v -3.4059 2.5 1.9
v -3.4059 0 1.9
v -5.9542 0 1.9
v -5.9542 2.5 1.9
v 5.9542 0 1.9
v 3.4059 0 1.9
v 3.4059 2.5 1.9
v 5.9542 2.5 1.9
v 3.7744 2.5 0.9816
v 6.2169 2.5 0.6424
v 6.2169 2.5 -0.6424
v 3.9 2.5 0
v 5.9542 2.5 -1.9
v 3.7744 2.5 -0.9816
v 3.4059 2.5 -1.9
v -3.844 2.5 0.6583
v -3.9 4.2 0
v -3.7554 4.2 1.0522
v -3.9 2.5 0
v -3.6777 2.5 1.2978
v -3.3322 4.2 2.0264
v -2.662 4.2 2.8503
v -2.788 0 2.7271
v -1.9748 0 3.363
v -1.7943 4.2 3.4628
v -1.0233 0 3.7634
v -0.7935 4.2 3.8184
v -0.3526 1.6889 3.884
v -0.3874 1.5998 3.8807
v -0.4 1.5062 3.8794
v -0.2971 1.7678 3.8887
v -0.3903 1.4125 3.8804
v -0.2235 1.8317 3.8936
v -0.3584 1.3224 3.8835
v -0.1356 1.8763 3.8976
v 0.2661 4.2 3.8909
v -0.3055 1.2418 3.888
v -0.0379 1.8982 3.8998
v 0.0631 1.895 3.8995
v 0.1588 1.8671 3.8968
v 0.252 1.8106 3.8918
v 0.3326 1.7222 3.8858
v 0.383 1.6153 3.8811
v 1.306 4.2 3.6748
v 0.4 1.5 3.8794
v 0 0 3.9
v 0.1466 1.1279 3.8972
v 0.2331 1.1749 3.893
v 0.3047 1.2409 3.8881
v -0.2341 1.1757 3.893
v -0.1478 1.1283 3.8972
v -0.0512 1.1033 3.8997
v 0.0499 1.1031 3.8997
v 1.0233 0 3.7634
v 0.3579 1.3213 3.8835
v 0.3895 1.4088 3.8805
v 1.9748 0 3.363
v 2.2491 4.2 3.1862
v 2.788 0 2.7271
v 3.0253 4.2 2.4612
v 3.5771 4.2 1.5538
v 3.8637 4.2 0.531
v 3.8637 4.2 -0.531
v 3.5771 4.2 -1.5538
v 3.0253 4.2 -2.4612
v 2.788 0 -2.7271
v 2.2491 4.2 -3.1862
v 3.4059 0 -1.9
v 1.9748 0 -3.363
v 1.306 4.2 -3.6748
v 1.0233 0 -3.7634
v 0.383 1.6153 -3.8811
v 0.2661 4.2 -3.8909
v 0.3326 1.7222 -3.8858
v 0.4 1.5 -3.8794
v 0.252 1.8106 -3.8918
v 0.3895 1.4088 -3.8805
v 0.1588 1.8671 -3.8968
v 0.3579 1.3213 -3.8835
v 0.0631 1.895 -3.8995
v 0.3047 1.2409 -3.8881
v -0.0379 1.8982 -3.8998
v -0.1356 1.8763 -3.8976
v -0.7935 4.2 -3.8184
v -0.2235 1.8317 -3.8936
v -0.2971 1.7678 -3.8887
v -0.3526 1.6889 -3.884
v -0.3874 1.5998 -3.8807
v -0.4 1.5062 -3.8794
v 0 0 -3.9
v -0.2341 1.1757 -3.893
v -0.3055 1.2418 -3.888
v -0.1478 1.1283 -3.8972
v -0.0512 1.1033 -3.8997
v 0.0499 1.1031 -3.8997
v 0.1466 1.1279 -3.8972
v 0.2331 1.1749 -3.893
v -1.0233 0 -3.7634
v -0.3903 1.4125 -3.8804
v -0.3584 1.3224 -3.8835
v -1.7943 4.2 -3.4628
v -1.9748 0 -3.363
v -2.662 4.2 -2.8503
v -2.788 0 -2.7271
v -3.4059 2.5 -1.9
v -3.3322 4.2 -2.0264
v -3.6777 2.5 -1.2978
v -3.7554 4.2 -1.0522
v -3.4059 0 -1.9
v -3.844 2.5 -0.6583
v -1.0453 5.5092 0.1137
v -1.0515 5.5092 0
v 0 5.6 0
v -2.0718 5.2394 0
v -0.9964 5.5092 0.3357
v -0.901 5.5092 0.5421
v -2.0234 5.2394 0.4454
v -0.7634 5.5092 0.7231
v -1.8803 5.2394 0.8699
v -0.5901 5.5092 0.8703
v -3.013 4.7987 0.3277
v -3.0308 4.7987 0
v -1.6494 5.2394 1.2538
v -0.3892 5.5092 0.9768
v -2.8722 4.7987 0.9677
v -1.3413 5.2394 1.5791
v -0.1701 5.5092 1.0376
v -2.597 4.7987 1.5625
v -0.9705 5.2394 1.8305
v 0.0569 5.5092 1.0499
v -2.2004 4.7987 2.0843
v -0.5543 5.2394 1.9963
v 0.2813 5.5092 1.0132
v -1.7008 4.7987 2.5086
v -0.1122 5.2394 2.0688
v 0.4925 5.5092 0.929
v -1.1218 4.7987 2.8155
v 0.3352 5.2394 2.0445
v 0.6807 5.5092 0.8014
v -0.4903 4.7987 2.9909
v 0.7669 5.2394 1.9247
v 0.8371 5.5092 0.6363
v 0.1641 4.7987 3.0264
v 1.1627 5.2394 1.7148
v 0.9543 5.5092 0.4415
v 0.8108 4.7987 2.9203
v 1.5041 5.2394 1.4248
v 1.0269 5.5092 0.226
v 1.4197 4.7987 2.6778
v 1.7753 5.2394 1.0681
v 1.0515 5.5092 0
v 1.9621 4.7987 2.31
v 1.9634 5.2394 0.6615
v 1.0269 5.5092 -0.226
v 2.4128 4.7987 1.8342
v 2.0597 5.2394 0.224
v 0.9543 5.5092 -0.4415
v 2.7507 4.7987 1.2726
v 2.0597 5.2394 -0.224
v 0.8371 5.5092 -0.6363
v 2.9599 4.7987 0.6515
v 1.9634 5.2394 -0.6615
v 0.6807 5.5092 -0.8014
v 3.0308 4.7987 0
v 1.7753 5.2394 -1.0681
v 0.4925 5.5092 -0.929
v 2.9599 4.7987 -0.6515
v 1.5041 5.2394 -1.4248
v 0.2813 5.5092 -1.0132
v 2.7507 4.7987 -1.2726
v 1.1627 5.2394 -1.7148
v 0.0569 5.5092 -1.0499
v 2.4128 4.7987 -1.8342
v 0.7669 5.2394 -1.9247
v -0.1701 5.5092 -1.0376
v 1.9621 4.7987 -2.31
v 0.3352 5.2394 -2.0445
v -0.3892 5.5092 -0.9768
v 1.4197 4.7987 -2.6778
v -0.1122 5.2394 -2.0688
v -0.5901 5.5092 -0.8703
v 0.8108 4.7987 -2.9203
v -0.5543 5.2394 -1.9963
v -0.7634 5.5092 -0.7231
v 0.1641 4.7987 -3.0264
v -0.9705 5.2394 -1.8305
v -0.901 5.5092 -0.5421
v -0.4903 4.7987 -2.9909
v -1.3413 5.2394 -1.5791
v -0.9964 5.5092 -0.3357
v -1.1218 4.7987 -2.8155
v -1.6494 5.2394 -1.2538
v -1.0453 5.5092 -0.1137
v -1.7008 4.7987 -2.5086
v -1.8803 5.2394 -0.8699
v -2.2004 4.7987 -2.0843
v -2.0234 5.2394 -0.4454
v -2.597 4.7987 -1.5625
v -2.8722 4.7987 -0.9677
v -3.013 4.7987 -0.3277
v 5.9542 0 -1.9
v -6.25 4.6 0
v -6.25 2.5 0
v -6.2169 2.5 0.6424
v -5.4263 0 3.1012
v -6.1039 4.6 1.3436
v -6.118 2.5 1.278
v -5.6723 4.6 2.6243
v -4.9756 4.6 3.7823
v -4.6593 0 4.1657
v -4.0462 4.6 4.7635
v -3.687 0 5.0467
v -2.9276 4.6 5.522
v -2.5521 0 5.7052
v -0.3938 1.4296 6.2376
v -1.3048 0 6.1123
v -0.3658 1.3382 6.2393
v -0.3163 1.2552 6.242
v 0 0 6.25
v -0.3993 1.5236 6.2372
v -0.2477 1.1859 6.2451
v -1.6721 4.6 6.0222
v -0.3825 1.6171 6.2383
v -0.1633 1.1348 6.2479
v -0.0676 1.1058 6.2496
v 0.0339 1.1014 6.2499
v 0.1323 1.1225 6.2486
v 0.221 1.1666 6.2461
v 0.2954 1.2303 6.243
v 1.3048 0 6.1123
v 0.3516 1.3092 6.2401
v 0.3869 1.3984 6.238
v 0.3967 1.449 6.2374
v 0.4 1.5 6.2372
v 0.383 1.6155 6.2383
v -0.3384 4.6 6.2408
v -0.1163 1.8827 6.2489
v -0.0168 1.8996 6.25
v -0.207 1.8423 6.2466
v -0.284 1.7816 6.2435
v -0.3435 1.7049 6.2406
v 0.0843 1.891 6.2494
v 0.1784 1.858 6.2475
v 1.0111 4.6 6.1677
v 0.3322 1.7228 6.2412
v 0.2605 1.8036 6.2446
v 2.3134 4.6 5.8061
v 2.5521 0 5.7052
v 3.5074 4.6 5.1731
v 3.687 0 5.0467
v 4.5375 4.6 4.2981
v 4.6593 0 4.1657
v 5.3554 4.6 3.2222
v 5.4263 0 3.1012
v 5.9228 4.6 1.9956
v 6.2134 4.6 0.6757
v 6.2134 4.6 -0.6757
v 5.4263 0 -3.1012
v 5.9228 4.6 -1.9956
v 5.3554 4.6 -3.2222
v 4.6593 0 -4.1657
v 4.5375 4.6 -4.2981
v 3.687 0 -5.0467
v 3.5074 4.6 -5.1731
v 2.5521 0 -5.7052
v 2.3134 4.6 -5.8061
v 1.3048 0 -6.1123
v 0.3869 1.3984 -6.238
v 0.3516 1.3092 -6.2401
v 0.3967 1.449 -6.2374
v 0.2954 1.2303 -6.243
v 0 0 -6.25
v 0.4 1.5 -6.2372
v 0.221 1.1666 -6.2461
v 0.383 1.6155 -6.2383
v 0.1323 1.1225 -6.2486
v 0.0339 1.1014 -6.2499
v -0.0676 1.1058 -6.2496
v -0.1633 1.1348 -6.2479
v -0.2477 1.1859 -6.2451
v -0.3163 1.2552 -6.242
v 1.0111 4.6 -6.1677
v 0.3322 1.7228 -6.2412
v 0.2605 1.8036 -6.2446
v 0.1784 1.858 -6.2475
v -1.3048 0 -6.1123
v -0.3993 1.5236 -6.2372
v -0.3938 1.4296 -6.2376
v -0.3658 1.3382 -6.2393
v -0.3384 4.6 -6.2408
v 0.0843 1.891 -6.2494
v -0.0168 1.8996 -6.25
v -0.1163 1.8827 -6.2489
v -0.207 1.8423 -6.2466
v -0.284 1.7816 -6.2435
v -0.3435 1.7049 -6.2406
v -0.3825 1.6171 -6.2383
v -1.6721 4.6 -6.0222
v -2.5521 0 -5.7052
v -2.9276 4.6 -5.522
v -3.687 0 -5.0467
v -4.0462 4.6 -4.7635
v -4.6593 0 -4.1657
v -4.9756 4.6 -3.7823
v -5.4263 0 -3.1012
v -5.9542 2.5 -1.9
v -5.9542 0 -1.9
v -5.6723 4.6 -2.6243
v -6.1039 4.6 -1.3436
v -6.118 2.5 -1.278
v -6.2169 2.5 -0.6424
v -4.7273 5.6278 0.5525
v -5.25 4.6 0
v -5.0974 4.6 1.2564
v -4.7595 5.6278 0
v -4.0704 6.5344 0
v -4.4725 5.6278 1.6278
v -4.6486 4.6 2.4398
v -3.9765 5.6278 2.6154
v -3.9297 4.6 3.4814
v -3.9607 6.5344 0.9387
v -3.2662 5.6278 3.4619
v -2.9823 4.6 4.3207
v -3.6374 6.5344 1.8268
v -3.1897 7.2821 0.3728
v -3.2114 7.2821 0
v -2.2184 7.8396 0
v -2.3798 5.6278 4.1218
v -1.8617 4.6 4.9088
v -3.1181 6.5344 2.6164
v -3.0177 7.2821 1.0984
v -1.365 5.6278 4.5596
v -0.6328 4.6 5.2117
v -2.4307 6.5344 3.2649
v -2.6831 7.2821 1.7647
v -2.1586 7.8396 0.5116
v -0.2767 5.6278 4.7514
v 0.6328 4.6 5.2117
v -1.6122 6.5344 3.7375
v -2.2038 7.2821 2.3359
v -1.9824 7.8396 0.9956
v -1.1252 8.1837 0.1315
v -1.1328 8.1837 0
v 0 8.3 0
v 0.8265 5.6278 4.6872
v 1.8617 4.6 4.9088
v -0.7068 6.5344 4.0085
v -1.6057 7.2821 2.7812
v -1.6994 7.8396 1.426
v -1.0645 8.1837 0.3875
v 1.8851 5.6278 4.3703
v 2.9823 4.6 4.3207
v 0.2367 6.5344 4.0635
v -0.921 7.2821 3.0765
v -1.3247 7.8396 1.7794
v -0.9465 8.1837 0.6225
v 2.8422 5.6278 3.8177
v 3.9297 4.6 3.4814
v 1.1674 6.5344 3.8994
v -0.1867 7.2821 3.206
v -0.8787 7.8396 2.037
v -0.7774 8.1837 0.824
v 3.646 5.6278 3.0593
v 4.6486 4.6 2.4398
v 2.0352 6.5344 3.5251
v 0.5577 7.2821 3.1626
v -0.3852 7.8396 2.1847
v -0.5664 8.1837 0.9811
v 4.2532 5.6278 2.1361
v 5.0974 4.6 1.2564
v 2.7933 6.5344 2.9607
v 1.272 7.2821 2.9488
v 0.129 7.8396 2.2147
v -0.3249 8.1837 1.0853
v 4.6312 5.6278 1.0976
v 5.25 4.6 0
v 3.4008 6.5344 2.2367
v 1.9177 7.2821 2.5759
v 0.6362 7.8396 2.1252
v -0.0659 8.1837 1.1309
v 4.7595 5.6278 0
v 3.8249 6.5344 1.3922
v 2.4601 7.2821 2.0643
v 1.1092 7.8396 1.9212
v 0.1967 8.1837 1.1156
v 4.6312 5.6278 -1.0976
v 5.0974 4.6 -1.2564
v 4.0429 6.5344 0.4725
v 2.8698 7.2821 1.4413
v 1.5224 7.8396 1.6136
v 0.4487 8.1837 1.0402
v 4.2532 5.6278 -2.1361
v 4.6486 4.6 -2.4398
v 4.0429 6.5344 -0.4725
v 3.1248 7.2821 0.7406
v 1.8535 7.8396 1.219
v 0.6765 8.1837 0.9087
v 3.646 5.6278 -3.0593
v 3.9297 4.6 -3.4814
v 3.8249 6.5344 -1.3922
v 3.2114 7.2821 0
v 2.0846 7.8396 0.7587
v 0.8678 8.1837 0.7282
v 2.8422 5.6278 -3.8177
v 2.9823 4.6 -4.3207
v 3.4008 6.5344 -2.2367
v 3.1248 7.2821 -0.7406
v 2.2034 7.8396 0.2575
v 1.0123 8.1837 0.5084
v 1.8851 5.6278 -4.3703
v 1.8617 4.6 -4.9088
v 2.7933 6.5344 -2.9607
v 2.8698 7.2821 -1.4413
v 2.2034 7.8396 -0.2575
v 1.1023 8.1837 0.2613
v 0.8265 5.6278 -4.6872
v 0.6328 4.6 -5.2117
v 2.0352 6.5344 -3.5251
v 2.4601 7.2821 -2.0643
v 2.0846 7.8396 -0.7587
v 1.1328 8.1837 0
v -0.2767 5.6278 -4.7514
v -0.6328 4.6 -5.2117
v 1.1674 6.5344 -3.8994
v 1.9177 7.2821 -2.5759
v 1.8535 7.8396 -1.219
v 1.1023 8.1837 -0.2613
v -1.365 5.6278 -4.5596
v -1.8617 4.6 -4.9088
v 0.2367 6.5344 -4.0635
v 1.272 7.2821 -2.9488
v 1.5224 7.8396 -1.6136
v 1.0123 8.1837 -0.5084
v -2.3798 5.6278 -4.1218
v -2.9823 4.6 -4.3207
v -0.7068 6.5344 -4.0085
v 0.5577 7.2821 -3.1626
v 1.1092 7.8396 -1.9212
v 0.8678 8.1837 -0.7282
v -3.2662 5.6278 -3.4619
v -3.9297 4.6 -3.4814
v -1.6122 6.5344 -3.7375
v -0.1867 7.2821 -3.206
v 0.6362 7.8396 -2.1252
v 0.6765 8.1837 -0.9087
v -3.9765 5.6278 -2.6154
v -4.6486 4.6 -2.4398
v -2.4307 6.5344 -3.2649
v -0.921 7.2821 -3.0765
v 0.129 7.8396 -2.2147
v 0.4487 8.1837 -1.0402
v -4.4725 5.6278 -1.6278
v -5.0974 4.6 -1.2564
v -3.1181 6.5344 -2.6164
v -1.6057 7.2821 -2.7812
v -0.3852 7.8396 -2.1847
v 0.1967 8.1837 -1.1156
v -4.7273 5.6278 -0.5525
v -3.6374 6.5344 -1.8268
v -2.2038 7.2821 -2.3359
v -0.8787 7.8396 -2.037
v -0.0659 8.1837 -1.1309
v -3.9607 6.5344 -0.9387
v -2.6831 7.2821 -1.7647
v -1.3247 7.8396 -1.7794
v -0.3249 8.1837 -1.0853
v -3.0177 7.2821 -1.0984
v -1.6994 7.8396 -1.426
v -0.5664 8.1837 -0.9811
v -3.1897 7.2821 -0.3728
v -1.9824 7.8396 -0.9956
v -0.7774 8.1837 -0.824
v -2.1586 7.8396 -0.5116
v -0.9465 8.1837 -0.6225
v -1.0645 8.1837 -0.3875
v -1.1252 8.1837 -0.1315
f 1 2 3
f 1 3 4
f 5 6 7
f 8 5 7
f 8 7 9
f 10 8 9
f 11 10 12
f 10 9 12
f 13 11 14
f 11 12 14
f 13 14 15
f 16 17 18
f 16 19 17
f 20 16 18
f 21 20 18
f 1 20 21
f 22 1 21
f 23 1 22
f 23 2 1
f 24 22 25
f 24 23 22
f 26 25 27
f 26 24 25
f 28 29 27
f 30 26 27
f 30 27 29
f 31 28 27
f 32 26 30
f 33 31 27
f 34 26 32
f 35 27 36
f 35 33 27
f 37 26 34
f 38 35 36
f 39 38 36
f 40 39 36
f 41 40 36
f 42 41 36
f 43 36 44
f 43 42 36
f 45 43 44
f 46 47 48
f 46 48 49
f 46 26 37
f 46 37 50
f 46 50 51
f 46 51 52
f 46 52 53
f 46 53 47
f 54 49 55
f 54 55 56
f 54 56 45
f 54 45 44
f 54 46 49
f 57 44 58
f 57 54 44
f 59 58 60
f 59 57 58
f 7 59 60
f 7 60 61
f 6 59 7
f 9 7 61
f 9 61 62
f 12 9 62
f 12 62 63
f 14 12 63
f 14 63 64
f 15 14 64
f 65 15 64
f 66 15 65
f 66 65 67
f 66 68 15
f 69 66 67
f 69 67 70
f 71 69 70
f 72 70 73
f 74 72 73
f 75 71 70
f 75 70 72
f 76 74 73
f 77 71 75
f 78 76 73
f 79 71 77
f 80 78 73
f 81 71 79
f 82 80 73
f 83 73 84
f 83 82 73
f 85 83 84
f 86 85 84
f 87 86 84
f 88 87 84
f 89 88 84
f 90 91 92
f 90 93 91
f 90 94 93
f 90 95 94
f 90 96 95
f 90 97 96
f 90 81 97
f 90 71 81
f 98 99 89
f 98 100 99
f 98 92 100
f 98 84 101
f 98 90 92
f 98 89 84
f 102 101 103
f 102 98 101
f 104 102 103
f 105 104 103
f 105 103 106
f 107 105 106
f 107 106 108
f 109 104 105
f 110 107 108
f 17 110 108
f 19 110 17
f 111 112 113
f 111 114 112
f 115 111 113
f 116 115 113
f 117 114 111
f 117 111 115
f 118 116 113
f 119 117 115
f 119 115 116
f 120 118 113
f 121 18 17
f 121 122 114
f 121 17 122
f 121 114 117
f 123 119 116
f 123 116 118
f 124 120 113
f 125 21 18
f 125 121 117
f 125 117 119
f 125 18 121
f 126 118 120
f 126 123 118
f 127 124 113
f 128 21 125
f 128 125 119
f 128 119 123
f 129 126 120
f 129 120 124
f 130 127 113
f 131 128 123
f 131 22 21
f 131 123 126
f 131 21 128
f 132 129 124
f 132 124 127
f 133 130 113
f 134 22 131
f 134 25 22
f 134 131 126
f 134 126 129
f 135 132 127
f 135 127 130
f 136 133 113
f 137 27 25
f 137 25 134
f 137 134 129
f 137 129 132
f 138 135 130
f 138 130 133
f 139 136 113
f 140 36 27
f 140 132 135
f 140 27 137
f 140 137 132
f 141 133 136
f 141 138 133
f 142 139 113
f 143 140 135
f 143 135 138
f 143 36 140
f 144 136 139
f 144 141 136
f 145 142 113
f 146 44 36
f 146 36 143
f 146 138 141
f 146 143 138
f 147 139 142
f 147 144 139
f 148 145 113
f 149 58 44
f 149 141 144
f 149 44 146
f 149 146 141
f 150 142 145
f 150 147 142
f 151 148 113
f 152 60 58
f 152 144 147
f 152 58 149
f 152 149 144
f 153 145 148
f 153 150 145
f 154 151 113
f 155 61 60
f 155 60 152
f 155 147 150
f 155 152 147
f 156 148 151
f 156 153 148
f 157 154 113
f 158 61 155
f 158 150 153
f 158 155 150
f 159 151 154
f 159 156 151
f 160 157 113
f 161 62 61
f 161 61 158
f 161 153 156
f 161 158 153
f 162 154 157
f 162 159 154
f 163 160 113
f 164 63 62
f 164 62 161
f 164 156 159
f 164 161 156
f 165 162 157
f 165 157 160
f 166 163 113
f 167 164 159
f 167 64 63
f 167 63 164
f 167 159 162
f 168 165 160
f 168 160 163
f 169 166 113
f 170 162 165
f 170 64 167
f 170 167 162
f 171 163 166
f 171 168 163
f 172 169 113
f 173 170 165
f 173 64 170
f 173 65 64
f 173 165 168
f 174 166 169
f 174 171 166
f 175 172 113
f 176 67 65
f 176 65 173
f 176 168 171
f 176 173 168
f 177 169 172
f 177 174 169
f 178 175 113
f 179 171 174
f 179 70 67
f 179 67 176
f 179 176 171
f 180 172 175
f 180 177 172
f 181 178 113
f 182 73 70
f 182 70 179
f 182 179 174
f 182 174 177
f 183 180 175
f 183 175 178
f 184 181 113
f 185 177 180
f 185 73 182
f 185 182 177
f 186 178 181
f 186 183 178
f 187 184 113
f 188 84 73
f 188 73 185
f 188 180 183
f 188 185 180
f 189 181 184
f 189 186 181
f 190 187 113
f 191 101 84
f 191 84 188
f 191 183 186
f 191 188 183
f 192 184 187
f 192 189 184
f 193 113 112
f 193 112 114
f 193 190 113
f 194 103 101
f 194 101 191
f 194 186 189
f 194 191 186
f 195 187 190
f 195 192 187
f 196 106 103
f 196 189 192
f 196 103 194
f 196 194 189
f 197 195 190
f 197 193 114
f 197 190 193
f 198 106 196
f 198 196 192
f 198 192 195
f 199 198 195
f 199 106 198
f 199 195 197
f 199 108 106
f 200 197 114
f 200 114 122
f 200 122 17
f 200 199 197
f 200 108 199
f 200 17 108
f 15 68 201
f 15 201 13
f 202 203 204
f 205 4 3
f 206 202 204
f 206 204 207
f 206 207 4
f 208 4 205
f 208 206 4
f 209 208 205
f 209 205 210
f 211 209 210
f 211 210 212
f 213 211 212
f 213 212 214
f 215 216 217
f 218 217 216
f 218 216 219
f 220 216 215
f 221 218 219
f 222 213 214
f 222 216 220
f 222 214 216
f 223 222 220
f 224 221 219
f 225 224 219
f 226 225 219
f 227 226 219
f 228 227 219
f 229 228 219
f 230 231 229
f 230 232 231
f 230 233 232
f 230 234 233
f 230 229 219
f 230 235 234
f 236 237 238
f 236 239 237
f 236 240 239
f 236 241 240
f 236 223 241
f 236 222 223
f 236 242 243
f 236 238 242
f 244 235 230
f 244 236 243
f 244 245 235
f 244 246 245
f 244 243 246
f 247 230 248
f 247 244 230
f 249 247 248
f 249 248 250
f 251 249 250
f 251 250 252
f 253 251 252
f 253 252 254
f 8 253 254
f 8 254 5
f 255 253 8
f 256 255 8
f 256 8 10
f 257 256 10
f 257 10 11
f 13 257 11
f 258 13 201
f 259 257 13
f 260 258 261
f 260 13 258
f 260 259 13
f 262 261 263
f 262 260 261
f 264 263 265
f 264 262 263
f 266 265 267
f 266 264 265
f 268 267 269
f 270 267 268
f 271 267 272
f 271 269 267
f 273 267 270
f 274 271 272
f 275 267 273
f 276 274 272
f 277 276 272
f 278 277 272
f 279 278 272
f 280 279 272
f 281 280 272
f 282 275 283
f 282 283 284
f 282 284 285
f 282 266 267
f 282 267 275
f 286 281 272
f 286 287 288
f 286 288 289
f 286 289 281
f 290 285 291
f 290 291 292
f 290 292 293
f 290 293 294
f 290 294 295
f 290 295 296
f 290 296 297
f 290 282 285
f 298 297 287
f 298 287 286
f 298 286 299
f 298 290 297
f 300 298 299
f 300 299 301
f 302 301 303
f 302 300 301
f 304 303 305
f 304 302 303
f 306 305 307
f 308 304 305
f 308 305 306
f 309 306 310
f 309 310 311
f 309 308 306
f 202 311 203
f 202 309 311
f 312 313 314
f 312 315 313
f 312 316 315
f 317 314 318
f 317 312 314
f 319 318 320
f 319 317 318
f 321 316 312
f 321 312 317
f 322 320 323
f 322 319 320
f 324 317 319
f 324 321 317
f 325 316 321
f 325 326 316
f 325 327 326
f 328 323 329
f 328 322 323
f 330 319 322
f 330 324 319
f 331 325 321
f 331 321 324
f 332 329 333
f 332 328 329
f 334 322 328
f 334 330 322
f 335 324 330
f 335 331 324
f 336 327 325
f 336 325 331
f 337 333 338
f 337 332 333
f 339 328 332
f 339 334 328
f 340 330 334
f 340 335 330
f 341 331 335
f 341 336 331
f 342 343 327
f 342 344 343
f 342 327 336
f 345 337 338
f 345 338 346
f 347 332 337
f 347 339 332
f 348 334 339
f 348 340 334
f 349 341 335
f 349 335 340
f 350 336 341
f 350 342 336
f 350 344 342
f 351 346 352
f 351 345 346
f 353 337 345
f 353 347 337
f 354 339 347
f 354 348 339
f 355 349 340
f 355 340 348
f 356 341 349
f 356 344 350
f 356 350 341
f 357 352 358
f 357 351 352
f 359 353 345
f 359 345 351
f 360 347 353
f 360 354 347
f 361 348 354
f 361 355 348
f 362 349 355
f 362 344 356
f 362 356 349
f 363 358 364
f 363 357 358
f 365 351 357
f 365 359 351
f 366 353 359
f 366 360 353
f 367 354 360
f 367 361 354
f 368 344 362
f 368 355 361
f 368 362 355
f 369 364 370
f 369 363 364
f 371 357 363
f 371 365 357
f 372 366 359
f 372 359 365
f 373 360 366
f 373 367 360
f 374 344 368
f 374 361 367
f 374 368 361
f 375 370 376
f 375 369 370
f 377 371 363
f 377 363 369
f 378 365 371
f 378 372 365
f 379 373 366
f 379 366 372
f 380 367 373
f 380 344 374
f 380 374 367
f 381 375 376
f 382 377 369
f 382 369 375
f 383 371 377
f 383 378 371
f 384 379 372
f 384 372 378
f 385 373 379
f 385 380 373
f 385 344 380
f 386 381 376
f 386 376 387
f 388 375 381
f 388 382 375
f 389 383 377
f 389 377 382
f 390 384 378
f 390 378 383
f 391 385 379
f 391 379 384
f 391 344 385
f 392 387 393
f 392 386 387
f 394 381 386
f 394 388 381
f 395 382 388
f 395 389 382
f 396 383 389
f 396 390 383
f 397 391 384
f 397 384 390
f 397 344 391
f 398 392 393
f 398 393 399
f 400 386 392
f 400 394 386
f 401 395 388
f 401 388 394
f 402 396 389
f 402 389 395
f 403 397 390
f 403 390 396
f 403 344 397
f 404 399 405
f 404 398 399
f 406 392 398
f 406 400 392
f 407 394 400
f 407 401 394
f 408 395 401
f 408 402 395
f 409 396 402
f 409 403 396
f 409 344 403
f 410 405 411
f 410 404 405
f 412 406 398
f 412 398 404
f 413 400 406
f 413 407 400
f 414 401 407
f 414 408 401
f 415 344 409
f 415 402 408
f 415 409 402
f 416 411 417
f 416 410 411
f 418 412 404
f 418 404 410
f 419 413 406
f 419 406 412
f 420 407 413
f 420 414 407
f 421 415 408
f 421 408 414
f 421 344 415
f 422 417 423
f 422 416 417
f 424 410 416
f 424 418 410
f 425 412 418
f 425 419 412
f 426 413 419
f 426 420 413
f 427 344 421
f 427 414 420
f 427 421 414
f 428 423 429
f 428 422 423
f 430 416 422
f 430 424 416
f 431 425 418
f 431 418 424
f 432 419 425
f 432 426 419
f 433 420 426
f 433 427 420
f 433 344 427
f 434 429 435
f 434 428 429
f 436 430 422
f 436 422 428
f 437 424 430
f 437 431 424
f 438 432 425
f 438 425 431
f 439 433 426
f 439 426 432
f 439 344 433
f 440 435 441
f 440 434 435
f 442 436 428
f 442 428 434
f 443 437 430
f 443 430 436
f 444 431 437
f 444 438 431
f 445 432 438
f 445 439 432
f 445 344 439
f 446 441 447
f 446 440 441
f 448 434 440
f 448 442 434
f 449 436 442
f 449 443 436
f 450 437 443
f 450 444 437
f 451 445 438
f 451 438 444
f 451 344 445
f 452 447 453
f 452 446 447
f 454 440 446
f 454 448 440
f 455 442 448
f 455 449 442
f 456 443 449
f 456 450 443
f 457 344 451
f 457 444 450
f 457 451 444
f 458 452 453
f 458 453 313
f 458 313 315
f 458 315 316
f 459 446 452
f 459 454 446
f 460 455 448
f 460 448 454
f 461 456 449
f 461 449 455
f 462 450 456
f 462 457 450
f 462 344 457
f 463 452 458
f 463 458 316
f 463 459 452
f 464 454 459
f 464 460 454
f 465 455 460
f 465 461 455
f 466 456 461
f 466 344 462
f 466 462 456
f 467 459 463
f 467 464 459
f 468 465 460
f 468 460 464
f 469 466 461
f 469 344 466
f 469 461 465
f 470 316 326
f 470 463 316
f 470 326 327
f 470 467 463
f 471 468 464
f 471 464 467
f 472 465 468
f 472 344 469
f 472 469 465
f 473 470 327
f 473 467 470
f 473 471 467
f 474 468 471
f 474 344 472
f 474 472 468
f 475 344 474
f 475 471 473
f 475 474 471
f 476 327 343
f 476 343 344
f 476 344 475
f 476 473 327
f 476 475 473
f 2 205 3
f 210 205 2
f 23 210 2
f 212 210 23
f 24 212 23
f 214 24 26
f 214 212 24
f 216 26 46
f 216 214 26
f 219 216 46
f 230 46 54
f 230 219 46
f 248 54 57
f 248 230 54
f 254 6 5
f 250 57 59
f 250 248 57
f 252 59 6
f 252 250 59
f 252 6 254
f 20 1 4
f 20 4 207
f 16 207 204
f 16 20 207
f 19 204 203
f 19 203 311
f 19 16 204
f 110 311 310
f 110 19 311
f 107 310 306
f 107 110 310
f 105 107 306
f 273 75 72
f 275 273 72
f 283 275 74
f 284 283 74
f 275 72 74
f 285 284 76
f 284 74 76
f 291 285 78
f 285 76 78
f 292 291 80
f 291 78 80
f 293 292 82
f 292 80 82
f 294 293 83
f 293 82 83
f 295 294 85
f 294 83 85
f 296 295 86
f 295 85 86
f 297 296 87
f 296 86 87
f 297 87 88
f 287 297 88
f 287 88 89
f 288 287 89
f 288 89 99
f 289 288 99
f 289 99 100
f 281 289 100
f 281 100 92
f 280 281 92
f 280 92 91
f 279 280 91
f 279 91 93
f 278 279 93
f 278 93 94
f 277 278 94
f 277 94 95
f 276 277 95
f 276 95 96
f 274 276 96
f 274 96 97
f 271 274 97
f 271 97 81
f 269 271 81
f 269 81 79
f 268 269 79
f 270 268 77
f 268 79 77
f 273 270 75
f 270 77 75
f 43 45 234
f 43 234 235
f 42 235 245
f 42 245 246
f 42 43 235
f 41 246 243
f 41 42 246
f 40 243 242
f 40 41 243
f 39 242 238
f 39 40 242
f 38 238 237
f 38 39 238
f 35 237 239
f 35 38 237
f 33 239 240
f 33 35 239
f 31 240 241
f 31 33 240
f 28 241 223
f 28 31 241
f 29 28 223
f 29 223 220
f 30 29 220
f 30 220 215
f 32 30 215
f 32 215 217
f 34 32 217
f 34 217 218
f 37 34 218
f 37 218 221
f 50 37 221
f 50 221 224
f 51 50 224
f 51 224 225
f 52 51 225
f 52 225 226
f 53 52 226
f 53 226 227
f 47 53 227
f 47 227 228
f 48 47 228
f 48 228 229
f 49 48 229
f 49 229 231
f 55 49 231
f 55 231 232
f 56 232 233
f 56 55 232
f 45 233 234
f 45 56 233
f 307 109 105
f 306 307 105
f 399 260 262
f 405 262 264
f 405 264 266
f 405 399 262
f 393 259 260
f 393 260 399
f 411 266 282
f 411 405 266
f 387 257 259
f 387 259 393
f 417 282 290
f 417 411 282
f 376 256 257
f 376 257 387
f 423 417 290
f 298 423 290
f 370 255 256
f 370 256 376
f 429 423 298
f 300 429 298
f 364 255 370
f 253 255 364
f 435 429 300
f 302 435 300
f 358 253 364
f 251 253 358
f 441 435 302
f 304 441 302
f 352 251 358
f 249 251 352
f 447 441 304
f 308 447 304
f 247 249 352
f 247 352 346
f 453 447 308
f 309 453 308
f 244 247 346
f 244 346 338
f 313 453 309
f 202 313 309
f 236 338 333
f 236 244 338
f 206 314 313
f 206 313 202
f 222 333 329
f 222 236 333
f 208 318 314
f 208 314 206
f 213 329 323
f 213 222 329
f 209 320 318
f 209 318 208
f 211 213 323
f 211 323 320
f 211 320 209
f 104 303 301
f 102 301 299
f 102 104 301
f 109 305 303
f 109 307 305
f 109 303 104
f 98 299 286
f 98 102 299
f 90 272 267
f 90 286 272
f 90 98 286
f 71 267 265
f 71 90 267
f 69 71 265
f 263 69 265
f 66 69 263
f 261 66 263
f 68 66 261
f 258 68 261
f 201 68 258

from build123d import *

# Parameters (mm, degrees)
SKETCH2_W               = 3.8
SKETCH2_H               = 2.5
CUT_EXTRUDE1_DEPTH      = 10
CUT_EXTRUDE1_DEPTH_BACK = 7.25
SKETCH3_R               = 0.4
CUT_EXTRUDE2_DEPTH      = 7.25
CUT_EXTRUDE2_DEPTH_BACK = 7.25


with BuildPart() as part:
    # Sketch1 → Revolve1 (revolve)
    with BuildSketch(Plane.XY):
        with BuildLine():
            Line((0, 8.3), (0, 5.6))
            ThreePointArc((0, 5.6), (-2.071834936, 5.23939732), (-3.9, 4.2))
            Line((-3.9, 4.2), (-3.9, 0))
            Line((-3.9, 0), (-6.25, 0))
            Line((-6.25, 0), (-6.25, 4.6))
            Line((-6.25, 4.6), (-5.25, 4.6))
            ThreePointArc((-5.25, 4.6), (-3.211405456, 7.282061795), (0, 8.3))
        make_face()
    revolve(axis=Axis((0, 0, 0), (0, 1, 0)))

    # Sketch2 → Cut-Extrude1 (cut, two sides)
    with BuildSketch(Plane(origin=(0, 0, 0), x_dir=(0, 0, -1), z_dir=(1, 0, 0))) as cut_extrude1_sk:
        with Locations((0, 1.25)):
            Rectangle(SKETCH2_W, SKETCH2_H)
    extrude(amount=CUT_EXTRUDE1_DEPTH, mode=Mode.SUBTRACT)
    extrude(cut_extrude1_sk.sketch, amount=-CUT_EXTRUDE1_DEPTH_BACK, mode=Mode.SUBTRACT)

    # Sketch3 → Cut-Extrude2 (cut, two sides)
    with BuildSketch(Plane.XY) as cut_extrude2_sk:
        with Locations((0, 1.5)):
            Circle(SKETCH3_R)
    extrude(amount=CUT_EXTRUDE2_DEPTH, mode=Mode.SUBTRACT)
    extrude(cut_extrude2_sk.sketch, amount=-CUT_EXTRUDE2_DEPTH_BACK, mode=Mode.SUBTRACT)


solid = part.part
